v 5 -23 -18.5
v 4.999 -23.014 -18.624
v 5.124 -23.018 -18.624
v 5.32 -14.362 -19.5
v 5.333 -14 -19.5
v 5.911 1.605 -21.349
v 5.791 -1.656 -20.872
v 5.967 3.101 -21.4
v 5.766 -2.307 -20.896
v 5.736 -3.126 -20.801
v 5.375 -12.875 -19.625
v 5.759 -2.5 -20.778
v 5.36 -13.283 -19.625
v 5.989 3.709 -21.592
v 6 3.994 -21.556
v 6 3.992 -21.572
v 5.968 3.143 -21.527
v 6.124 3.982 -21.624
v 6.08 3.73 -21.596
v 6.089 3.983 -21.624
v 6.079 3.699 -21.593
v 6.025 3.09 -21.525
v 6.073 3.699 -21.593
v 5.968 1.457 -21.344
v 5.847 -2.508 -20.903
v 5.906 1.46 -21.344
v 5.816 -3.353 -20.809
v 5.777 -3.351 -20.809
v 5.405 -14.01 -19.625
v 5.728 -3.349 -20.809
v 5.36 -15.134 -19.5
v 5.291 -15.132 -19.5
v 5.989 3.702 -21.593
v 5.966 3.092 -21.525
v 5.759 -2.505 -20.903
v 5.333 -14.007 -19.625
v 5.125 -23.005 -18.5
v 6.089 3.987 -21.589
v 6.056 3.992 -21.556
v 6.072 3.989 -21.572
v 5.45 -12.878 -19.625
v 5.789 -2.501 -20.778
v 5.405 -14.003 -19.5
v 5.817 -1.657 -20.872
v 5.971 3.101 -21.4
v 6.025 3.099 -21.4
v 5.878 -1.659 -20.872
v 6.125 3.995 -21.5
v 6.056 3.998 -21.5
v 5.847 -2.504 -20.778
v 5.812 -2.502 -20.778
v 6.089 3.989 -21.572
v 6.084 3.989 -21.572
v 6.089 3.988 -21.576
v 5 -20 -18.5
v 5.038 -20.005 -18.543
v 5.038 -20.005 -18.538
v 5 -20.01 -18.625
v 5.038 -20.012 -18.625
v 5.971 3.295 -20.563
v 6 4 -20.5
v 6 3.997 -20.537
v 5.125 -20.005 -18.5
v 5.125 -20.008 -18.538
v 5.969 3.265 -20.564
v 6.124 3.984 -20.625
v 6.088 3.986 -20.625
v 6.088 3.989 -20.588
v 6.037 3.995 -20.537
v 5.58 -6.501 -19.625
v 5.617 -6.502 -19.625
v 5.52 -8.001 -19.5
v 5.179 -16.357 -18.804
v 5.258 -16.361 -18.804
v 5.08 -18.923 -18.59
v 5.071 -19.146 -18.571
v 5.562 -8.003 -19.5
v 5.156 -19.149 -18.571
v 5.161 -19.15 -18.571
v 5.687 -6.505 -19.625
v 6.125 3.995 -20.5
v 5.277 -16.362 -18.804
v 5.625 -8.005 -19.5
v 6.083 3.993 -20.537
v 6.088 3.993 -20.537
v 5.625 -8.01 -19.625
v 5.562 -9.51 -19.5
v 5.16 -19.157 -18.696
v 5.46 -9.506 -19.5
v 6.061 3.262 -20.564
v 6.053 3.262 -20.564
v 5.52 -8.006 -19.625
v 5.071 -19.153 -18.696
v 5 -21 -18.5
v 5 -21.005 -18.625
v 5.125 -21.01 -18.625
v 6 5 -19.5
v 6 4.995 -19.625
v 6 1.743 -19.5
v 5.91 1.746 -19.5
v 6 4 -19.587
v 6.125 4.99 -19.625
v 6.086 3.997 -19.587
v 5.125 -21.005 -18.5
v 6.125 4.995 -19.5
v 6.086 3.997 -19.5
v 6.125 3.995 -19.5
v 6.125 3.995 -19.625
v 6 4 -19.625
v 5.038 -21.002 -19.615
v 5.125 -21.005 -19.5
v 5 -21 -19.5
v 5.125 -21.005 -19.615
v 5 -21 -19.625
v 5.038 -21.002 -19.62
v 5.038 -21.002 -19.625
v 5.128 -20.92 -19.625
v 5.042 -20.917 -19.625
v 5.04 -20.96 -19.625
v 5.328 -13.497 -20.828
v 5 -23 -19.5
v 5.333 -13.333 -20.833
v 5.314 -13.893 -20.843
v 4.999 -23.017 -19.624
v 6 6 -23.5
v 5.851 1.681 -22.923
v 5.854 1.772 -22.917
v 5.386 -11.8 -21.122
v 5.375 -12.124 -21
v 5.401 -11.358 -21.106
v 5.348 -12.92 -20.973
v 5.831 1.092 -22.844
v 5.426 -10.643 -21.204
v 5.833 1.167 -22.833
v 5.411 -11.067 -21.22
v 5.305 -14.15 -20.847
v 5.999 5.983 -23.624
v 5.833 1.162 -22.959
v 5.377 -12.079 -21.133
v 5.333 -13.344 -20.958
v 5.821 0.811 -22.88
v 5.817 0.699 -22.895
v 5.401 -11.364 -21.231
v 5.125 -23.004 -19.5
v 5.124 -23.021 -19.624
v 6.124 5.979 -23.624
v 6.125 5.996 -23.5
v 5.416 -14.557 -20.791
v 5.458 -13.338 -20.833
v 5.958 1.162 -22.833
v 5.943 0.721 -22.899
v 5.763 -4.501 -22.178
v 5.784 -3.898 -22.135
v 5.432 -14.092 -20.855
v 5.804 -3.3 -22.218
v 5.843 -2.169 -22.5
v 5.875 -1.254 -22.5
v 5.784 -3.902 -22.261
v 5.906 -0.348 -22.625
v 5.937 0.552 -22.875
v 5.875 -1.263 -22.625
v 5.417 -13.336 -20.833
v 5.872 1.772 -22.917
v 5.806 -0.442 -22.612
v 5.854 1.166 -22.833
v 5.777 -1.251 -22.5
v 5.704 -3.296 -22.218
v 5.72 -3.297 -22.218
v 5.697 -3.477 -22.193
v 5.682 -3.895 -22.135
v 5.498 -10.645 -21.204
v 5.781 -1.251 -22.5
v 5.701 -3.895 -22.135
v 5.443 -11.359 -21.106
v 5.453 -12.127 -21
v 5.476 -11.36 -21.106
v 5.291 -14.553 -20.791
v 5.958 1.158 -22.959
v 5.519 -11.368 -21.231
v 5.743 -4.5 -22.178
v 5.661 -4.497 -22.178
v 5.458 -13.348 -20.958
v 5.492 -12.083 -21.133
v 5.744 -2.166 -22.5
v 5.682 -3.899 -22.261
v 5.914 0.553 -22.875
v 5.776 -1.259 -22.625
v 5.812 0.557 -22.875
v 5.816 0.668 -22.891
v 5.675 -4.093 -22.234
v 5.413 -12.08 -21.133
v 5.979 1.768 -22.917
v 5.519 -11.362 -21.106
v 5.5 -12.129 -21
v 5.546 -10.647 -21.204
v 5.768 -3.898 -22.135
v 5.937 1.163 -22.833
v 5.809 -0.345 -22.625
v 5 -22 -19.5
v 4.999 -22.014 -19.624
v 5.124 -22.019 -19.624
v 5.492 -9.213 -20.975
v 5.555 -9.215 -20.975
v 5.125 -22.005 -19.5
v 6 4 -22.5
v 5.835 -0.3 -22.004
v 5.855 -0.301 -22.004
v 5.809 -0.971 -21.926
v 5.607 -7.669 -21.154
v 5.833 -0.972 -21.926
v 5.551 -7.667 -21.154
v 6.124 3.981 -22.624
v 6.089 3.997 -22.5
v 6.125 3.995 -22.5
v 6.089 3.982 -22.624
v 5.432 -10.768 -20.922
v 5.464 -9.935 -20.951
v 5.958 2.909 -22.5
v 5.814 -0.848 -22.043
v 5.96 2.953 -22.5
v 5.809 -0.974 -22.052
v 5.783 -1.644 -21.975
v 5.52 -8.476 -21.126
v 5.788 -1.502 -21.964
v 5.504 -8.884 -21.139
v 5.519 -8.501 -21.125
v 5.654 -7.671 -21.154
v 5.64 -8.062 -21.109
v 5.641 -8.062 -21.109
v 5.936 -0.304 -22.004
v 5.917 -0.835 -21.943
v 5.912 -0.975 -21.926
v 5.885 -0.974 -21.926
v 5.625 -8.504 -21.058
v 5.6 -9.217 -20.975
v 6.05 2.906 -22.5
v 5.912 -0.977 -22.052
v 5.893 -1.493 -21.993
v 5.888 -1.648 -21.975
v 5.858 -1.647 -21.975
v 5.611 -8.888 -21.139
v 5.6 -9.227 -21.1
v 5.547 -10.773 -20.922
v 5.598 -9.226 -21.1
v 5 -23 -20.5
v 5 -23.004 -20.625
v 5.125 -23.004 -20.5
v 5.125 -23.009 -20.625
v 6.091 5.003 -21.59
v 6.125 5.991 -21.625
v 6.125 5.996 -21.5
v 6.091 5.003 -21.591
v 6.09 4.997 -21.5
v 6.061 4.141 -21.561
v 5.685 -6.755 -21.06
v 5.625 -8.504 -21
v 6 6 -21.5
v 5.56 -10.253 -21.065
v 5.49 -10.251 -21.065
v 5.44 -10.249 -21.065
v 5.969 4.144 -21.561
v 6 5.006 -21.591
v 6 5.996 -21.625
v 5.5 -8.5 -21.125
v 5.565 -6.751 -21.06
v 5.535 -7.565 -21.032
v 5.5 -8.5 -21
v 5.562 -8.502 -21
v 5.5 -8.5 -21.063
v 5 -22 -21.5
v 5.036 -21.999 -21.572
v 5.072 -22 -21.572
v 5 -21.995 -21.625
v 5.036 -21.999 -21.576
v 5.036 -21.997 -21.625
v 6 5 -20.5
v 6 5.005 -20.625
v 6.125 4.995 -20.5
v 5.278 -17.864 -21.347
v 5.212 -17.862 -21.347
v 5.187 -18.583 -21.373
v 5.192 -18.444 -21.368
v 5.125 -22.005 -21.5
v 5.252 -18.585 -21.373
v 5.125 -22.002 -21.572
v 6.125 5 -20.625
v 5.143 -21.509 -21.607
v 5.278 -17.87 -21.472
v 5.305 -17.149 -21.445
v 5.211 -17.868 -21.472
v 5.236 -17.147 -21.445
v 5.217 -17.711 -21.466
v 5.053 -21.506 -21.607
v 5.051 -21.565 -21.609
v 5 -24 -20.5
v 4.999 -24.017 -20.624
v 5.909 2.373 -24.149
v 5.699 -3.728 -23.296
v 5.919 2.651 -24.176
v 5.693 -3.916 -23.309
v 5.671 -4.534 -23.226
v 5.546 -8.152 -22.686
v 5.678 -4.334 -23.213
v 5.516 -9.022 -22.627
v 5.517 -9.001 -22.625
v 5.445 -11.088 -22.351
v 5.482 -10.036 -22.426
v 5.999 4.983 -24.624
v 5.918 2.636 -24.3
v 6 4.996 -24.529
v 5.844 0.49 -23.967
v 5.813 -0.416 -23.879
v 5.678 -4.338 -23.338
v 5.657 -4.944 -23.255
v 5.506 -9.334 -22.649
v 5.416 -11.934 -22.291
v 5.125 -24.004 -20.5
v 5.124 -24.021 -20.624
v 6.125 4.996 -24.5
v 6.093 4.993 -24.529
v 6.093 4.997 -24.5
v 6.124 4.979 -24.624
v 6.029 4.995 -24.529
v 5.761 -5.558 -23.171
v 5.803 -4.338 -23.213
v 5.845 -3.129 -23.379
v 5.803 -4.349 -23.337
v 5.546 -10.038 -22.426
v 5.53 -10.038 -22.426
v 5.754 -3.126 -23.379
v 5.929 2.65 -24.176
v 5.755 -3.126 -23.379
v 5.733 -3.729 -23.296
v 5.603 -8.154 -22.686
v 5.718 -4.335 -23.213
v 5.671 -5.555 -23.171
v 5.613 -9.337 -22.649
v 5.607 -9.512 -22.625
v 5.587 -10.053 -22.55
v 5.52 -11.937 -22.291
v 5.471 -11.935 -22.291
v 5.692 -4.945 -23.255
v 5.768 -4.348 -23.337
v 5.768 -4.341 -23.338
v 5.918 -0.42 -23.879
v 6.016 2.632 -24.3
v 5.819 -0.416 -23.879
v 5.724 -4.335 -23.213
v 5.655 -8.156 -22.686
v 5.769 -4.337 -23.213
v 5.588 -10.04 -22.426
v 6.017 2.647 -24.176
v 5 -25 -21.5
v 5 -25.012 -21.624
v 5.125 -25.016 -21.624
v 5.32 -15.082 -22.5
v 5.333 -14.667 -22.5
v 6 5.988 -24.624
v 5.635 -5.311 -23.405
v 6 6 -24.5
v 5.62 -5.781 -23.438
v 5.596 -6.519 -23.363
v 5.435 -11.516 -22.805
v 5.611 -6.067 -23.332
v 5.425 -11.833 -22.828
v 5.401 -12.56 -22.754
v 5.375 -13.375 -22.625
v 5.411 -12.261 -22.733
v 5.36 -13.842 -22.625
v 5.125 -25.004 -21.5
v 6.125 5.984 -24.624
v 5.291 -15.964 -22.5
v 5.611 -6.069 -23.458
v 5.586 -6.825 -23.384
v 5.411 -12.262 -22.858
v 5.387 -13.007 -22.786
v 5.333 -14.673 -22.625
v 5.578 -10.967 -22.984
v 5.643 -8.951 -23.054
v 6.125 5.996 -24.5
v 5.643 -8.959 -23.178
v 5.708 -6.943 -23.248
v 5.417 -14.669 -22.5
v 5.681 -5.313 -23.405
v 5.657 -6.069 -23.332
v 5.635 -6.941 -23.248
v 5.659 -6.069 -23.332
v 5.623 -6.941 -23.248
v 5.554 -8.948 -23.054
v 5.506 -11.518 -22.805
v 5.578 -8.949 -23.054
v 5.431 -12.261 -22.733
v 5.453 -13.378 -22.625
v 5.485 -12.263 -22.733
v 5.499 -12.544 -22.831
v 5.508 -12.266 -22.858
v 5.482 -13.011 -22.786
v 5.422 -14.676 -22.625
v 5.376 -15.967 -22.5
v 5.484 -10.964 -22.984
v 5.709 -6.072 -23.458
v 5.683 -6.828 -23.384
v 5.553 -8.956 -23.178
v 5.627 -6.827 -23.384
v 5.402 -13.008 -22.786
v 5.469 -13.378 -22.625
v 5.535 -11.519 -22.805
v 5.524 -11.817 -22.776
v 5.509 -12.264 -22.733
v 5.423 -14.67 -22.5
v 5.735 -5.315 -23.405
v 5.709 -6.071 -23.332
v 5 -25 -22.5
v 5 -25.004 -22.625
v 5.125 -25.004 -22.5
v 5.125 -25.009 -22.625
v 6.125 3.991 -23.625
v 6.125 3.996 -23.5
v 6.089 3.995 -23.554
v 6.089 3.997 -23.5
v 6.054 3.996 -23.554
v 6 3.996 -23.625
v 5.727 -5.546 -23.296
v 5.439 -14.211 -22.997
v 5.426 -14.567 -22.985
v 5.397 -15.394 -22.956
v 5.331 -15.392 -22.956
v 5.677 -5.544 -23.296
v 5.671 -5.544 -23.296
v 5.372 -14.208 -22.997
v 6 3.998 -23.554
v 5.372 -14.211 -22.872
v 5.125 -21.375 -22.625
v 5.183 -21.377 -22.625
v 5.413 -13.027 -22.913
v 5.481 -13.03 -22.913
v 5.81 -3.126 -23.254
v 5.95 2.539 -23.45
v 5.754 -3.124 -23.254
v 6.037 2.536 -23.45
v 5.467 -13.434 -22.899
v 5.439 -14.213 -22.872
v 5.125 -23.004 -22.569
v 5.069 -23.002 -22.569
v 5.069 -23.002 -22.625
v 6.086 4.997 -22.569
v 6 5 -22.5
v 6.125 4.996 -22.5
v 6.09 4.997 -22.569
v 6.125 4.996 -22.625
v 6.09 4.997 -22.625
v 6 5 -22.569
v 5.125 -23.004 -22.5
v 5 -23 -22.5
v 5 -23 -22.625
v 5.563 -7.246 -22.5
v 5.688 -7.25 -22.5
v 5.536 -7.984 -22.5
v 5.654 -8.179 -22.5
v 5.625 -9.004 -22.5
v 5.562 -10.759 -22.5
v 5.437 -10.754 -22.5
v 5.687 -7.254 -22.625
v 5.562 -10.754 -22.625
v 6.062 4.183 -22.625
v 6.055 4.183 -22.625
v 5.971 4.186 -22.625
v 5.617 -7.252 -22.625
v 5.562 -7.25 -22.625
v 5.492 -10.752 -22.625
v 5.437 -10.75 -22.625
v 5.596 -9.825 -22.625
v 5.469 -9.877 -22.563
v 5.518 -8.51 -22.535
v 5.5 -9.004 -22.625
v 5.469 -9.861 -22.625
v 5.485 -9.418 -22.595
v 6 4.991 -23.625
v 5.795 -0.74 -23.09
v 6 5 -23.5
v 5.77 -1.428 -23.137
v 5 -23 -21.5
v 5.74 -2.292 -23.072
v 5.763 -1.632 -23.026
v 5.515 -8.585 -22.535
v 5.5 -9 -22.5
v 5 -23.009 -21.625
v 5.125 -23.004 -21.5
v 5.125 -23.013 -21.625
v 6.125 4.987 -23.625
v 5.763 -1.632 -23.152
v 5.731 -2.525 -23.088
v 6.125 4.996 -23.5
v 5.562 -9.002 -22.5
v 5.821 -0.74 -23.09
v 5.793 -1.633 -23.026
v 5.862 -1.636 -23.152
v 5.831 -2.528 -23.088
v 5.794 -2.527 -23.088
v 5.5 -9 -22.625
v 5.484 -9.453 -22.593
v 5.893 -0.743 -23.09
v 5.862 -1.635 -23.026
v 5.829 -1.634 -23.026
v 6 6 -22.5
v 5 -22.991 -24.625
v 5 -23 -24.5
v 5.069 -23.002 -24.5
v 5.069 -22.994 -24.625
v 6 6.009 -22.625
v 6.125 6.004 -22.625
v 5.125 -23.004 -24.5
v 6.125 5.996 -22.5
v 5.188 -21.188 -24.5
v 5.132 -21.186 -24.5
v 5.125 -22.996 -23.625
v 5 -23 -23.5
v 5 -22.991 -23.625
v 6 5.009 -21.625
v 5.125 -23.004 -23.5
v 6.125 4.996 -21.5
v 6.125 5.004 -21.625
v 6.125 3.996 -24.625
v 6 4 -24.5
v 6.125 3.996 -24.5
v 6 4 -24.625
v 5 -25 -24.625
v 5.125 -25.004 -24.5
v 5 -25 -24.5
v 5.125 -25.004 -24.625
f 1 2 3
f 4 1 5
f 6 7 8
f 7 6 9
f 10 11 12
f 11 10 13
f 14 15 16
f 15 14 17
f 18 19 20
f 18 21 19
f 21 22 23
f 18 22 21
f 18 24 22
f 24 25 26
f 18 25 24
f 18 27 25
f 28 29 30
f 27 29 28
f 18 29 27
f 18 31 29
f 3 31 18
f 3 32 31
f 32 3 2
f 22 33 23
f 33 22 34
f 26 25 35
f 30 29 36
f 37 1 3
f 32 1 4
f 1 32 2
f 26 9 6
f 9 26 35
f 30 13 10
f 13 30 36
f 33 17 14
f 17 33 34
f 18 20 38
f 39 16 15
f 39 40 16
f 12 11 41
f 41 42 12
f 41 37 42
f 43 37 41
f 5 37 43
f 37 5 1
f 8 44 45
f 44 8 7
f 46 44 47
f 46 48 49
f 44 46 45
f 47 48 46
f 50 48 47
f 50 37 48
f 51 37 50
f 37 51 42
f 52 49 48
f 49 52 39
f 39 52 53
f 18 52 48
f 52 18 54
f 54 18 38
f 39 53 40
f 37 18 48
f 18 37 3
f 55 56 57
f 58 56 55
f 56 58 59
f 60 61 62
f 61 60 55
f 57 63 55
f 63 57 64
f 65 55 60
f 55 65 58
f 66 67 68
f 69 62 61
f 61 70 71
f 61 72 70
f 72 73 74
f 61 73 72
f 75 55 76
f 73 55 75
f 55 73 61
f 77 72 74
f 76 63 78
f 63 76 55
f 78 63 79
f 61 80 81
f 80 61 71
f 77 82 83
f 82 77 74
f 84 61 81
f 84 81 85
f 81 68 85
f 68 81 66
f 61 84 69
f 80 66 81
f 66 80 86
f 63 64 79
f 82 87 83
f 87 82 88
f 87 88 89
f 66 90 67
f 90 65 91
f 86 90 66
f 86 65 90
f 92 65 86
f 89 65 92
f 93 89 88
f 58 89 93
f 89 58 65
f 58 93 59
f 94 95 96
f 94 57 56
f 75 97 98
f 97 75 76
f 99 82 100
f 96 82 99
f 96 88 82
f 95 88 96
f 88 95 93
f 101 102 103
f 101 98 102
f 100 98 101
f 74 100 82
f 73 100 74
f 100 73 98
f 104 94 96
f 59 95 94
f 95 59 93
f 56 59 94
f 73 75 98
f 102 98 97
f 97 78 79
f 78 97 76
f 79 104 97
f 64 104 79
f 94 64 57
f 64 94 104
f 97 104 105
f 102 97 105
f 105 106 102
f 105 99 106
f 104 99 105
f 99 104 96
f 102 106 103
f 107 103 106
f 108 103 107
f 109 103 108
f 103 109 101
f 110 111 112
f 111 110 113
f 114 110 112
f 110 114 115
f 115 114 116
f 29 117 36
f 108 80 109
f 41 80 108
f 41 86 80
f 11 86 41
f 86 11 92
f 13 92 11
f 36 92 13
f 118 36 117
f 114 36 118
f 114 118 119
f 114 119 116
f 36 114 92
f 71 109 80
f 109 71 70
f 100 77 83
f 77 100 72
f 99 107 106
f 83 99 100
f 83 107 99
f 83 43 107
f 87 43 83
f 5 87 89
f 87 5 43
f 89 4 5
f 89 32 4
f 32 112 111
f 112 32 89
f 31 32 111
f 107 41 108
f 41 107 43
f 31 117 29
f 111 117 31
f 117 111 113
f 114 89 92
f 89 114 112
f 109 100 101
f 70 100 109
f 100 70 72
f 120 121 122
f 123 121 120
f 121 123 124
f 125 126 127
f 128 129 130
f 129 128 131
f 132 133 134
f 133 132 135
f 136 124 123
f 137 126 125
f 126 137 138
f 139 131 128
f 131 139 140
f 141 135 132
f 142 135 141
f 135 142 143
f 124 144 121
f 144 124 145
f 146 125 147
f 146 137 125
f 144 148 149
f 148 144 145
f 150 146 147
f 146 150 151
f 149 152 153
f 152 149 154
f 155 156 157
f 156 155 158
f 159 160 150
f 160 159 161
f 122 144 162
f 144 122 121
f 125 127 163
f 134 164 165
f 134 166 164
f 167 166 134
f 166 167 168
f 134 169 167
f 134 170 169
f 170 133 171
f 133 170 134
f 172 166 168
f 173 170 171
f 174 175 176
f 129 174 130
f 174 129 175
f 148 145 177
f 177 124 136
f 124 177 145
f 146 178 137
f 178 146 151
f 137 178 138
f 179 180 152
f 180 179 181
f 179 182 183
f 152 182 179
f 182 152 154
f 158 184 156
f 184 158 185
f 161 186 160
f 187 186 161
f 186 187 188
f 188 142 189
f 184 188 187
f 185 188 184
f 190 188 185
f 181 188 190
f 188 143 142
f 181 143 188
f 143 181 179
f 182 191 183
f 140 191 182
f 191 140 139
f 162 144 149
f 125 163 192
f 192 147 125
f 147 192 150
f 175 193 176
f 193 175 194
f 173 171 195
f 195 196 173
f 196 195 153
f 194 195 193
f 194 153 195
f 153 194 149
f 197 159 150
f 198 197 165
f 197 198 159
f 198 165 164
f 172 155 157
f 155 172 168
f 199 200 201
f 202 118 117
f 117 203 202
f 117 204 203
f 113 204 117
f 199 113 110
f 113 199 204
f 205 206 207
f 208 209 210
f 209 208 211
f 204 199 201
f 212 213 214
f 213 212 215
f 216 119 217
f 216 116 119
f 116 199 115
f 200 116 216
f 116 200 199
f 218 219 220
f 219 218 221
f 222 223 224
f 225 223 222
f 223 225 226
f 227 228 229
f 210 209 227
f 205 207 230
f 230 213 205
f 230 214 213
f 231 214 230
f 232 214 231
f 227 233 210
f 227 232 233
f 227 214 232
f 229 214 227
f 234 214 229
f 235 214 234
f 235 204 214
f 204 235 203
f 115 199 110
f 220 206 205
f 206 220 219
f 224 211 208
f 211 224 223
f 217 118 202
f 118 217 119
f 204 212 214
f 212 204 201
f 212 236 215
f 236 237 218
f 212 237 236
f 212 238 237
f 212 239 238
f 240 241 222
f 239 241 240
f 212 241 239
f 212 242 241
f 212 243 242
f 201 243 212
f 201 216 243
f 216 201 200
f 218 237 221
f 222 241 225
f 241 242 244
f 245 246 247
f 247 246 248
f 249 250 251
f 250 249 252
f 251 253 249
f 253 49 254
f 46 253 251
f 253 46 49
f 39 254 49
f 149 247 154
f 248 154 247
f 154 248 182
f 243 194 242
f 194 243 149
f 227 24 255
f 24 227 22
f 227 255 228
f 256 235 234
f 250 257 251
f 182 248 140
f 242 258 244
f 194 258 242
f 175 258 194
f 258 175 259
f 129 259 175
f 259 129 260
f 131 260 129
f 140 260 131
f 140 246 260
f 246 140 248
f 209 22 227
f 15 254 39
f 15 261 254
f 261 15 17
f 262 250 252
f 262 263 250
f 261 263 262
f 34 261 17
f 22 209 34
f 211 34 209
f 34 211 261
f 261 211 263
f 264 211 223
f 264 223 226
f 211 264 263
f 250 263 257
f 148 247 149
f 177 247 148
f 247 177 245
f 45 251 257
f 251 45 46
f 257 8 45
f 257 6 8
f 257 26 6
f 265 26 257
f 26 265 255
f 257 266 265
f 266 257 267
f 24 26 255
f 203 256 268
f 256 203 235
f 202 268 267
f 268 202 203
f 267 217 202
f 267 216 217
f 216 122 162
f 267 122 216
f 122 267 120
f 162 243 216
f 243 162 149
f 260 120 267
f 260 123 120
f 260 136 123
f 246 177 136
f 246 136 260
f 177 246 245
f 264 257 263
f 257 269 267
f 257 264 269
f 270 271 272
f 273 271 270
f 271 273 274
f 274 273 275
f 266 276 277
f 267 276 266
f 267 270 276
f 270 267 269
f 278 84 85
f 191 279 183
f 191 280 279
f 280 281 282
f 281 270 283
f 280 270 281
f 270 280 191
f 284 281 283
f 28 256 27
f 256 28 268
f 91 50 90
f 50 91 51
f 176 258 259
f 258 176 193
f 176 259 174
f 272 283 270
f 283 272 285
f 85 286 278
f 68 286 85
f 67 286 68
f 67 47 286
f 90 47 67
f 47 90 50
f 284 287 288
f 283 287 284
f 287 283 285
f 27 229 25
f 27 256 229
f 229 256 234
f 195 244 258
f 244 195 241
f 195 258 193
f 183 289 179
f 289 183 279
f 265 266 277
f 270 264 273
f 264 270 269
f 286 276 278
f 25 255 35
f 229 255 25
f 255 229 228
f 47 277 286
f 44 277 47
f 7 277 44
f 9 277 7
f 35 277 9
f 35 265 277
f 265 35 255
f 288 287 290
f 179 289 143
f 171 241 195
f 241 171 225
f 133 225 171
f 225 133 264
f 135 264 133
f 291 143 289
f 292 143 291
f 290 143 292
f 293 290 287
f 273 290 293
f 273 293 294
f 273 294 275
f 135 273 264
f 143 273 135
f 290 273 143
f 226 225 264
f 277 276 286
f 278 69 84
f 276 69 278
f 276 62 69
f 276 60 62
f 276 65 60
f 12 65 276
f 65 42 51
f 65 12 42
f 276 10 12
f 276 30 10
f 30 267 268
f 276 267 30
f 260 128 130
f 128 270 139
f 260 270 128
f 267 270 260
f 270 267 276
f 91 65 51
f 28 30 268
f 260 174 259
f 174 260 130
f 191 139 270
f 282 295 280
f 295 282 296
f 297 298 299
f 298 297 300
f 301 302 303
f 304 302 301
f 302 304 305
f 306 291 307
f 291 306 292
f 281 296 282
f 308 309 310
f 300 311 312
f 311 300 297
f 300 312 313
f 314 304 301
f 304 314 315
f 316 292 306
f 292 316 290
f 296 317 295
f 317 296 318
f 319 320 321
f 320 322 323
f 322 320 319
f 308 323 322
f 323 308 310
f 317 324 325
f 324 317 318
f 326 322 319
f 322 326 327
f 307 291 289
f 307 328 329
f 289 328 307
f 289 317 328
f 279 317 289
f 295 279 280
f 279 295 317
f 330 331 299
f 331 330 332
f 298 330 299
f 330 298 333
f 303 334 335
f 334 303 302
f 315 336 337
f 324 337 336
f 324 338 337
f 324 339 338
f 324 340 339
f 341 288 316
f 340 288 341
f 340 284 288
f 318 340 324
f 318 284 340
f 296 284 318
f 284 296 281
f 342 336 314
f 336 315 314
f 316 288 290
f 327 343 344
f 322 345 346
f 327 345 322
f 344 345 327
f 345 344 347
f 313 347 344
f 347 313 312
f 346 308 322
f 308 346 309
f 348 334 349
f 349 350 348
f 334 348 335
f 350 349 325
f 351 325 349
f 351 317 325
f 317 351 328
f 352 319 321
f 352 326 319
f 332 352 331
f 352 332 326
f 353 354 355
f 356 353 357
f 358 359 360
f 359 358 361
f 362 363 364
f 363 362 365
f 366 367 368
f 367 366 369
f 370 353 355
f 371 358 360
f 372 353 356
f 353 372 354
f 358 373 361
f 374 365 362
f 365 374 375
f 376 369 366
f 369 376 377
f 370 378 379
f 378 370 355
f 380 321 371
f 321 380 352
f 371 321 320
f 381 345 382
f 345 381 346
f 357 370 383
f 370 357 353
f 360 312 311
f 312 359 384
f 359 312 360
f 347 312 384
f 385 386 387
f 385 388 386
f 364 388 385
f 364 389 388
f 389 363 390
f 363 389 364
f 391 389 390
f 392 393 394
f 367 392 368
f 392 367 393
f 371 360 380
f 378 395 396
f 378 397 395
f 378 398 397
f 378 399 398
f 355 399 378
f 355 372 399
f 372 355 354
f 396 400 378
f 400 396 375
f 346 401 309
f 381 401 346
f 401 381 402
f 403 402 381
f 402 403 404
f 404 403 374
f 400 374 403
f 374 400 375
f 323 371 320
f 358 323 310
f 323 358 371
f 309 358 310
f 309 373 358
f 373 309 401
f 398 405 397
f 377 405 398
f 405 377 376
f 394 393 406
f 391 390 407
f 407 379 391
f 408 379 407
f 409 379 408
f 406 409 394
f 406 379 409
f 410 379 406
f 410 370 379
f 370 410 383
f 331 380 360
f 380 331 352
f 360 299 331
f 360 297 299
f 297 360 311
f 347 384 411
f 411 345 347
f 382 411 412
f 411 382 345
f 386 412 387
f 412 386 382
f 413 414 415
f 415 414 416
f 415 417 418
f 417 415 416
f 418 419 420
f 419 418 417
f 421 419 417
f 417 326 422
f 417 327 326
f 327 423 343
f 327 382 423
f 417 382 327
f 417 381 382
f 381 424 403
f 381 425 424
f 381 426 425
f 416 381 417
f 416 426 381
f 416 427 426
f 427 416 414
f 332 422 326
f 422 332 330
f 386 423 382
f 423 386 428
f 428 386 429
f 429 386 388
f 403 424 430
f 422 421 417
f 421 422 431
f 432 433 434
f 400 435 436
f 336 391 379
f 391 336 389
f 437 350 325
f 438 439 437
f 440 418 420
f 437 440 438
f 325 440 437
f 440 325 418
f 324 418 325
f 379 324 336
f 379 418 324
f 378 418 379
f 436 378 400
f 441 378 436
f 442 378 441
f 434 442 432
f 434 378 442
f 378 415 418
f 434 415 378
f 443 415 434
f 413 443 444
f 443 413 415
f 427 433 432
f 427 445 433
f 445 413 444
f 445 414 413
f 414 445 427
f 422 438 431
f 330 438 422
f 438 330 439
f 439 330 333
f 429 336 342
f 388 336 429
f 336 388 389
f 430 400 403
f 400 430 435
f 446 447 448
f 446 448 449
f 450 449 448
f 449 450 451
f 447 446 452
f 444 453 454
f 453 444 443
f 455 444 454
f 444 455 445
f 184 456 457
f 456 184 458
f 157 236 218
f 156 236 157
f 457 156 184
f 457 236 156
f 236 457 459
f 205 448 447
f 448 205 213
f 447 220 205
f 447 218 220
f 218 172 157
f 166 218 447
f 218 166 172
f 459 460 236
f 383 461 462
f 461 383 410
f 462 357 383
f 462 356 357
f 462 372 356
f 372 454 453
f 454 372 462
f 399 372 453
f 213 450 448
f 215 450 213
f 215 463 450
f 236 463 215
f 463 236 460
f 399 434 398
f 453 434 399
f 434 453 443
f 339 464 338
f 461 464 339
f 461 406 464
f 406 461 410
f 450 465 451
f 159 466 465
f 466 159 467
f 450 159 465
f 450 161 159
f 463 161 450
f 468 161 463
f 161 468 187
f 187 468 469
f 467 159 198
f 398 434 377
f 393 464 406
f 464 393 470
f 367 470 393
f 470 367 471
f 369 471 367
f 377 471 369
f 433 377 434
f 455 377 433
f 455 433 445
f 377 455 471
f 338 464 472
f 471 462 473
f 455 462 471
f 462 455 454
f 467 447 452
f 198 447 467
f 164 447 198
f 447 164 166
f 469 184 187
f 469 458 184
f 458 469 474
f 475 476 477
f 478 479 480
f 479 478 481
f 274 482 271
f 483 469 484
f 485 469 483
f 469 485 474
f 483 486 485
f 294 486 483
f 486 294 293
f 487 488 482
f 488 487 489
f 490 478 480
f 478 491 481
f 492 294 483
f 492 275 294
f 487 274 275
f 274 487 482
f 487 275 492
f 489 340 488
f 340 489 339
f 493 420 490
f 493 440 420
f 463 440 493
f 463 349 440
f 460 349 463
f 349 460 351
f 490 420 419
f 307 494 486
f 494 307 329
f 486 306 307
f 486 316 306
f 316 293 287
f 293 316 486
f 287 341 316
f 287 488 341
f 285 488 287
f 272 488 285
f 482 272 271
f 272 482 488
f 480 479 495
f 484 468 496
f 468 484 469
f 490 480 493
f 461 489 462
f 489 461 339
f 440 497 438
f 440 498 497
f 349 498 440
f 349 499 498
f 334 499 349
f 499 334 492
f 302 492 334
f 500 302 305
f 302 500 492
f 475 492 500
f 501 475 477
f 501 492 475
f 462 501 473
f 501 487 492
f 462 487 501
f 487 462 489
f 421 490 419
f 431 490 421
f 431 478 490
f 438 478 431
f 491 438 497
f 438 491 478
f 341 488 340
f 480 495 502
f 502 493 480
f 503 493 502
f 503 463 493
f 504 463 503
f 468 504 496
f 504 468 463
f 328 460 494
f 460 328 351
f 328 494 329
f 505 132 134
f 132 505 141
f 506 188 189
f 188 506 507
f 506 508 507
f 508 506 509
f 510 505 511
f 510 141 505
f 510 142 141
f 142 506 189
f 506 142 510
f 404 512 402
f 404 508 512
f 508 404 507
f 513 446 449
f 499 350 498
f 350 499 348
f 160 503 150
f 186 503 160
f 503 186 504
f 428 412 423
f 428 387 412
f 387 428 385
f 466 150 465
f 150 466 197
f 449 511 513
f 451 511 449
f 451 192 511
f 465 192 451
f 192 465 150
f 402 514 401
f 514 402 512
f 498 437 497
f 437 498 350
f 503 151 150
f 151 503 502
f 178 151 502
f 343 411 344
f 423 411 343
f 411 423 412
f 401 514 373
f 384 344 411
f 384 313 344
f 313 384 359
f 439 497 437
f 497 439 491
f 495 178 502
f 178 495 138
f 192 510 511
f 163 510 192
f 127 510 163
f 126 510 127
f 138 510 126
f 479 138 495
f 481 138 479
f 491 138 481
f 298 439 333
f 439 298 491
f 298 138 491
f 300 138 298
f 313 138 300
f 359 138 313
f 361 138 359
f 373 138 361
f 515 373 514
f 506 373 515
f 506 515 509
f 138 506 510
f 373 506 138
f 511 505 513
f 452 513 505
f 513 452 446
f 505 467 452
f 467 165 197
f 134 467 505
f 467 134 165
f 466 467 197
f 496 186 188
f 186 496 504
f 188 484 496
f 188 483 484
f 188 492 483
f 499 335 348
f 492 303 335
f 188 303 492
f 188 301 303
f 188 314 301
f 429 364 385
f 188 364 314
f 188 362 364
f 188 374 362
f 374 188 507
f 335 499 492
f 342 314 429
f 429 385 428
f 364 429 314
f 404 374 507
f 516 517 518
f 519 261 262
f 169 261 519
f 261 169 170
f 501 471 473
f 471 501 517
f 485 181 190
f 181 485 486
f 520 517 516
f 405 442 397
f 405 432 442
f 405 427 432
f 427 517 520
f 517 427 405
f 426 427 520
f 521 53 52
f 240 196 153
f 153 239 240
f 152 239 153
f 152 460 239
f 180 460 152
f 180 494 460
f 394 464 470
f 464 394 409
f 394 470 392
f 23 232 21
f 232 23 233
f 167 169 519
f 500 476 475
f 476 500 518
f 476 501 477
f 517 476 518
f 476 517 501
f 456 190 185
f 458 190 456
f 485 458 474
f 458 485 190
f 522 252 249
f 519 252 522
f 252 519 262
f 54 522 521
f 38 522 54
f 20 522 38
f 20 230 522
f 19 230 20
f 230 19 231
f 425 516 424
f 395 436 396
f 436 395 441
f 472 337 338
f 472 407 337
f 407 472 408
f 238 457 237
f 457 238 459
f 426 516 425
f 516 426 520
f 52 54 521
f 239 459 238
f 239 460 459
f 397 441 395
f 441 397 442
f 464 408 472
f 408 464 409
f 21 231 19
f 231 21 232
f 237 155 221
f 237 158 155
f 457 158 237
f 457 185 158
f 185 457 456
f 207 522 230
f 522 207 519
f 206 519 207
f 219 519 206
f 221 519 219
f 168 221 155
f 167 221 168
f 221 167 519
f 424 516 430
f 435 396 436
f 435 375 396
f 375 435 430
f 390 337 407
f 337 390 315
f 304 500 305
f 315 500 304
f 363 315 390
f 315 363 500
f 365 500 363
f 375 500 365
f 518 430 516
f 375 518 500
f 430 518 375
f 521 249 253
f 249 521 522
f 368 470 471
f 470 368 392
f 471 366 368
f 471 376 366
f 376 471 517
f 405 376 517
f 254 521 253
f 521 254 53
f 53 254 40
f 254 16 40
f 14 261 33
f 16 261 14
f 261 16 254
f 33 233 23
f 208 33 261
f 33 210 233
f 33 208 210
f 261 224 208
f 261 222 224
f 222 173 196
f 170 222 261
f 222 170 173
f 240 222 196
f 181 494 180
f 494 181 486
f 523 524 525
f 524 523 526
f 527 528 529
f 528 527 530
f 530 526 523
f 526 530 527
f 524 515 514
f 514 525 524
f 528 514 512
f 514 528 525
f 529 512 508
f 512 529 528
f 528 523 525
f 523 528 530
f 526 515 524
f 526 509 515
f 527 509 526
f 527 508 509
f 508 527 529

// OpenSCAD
translate(v = [-0.5, -0.5, 0]) {
	/*Shell 0*/
	union() {
		%/*Nodes shell 0*/
		union();
		/*Edges shell 0*/
		union();
	}
	/*Shell 1*/
	union() {
		%/*Nodes shell 1*/
		union() {
			/*Node bank.devices[0].thingy.vcollect*/
			color(alpha = 0.1, c = "black") {
				translate(v = [1, -25, -23]) {
					cube(size = [1, 1, 1]);
				}
			}
			/*Node bank.devices[0].thingy.vlysis_out*/
			color(alpha = 0.1, c = "black") {
				translate(v = [1, 22, 25]) {
					cube(size = [1, 1, 1]);
				}
			}
			/*Node bank.devices[0].thingy.vwaste*/
			color(alpha = 0.1, c = "black") {
				translate(v = [1, -23, -25]) {
					cube(size = [1, 1, 1]);
				}
			}
			/*Node bank.devices[1].thingy.vcollect*/
			color(alpha = 0.1, c = "black") {
				translate(v = [1, -25, -21]) {
					cube(size = [1, 1, 1]);
				}
			}
			/*Node bank.devices[1].thingy.vlysis_out*/
			color(alpha = 0.1, c = "black") {
				translate(v = [1, 25, -25]) {
					cube(size = [1, 1, 1]);
				}
			}
			/*Node bank.devices[1].thingy.vwaste*/
			color(alpha = 0.1, c = "black") {
				translate(v = [1, -25, -22]) {
					cube(size = [1, 1, 1]);
				}
			}
			/*Node bank.devices[2].thingy.vcollect*/
			color(alpha = 0.1, c = "black") {
				translate(v = [1, -23, -22]) {
					cube(size = [1, 1, 1]);
				}
			}
			/*Node bank.devices[2].thingy.vlysis_out*/
			color(alpha = 0.1, c = "black") {
				translate(v = [1, 23, 25]) {
					cube(size = [1, 1, 1]);
				}
			}
			/*Node bank.devices[2].thingy.vwaste*/
			color(alpha = 0.1, c = "black") {
				translate(v = [1, -25, -24]) {
					cube(size = [1, 1, 1]);
				}
			}
			/*Node bank.devices[3].thingy.vcollect*/
			color(alpha = 0.1, c = "black") {
				translate(v = [1, -18, -25]) {
					cube(size = [1, 1, 1]);
				}
			}
			/*Node bank.devices[3].thingy.vlysis_out*/
			color(alpha = 0.1, c = "black") {
				translate(v = [1, 25, 22]) {
					cube(size = [1, 1, 1]);
				}
			}
			/*Node bank.devices[3].thingy.vwaste*/
			color(alpha = 0.1, c = "black") {
				translate(v = [1, -20, -25]) {
					cube(size = [1, 1, 1]);
				}
			}
			/*Node $_8__1*/
			color(alpha = 0.1, c = "lightblue") {
				translate(v = [1, -22, -25]) {
					cube(size = [1, 1, 1]);
				}
			}
			/*Node $_15__1*/
			color(alpha = 0.1, c = "lightblue") {
				translate(v = [1, 22, -25]) {
					cube(size = [1, 1, 1]);
				}
			}
			/*Node $_9__1*/
			color(alpha = 0.1, c = "lightblue") {
				translate(v = [1, -21, -25]) {
					cube(size = [1, 1, 1]);
				}
			}
			/*Node $_7__1*/
			color(alpha = 0.1, c = "lightblue") {
				translate(v = [1, -22, -24]) {
					cube(size = [1, 1, 1]);
				}
			}
			/*Node $_6__1*/
			color(alpha = 0.1, c = "lightblue") {
				translate(v = [1, -25, -25]) {
					cube(size = [1, 1, 1]);
				}
			}
			/*Node $_17__1*/
			color(alpha = 0.1, c = "lightblue") {
				translate(v = [1, 24, 25]) {
					cube(size = [1, 1, 1]);
				}
			}
			/*Node $_14__1*/
			color(alpha = 0.1, c = "lightblue") {
				translate(v = [1, 21, 25]) {
					cube(size = [1, 1, 1]);
				}
			}
			/*Node $_16__1*/
			color(alpha = 0.1, c = "lightblue") {
				translate(v = [1, 25, 25]) {
					cube(size = [1, 1, 1]);
				}
			}
		}
		/*Edges shell 1*/
		union();
	}
	/*Shell 2*/
	union() {
		%/*Nodes shell 2*/
		union();
		/*Edges shell 2*/
		union();
	}
	/*Shell 3*/
	union() {
		%/*Nodes shell 3*/
		union() {
			/*Node bank.devices[0].thingy.vbead_out*/
			color(alpha = 0.1, c = "black") {
				translate(v = [3, -10, -21]) {
					cube(size = [1, 1, 1]);
				}
			}
			/*Node bank.devices[0].thingy.vcell_out*/
			color(alpha = 0.1, c = "black") {
				translate(v = [3, -10, -23]) {
					cube(size = [1, 1, 1]);
				}
			}
			/*Node bank.devices[0].thingy.vpump1*/
			color(alpha = 0.1, c = "black") {
				translate(v = [3, -11, -23]) {
					cube(size = [1, 1, 1]);
				}
			}
			/*Node bank.devices[0].thingy.vpump2*/
			color(alpha = 0.1, c = "black") {
				translate(v = [3, -12, -25]) {
					cube(size = [1, 1, 1]);
				}
			}
			/*Node bank.devices[0].thingy.vpump3*/
			color(alpha = 0.1, c = "black") {
				translate(v = [3, -13, -23]) {
					cube(size = [1, 1, 1]);
				}
			}
			/*Node bank.devices[0].thingy.vsep*/
			color(alpha = 0.1, c = "black") {
				translate(v = [3, -12, -21]) {
					cube(size = [1, 1, 1]);
				}
			}
			/*Node bank.devices[0].thingy.vsieve*/
			color(alpha = 0.1, c = "black") {
				translate(v = [3, -12, -19]) {
					cube(size = [1, 1, 1]);
				}
			}
			/*Node bank.devices[1].thingy.vbead_out*/
			color(alpha = 0.1, c = "black") {
				translate(v = [3, -10, -20]) {
					cube(size = [1, 1, 1]);
				}
			}
			/*Node bank.devices[1].thingy.vcell_out*/
			color(alpha = 0.1, c = "black") {
				translate(v = [3, -13, -20]) {
					cube(size = [1, 1, 1]);
				}
			}
			/*Node bank.devices[1].thingy.vpump1*/
			color(alpha = 0.1, c = "black") {
				translate(v = [3, -13, -21]) {
					cube(size = [1, 1, 1]);
				}
			}
			/*Node bank.devices[1].thingy.vpump2*/
			color(alpha = 0.1, c = "black") {
				translate(v = [3, -14, -22]) {
					cube(size = [1, 1, 1]);
				}
			}
			/*Node bank.devices[1].thingy.vpump3*/
			color(alpha = 0.1, c = "black") {
				translate(v = [3, -13, -22]) {
					cube(size = [1, 1, 1]);
				}
			}
			/*Node bank.devices[1].thingy.vsep*/
			color(alpha = 0.1, c = "black") {
				translate(v = [3, -11, -20]) {
					cube(size = [1, 1, 1]);
				}
			}
			/*Node bank.devices[1].thingy.vsieve*/
			color(alpha = 0.1, c = "black") {
				translate(v = [3, -9, -21]) {
					cube(size = [1, 1, 1]);
				}
			}
			/*Node bank.devices[2].thingy.vbead_out*/
			color(alpha = 0.1, c = "black") {
				translate(v = [3, -9, -22]) {
					cube(size = [1, 1, 1]);
				}
			}
			/*Node bank.devices[2].thingy.vcell_out*/
			color(alpha = 0.1, c = "black") {
				translate(v = [3, -12, -20]) {
					cube(size = [1, 1, 1]);
				}
			}
			/*Node bank.devices[2].thingy.vpump1*/
			color(alpha = 0.1, c = "black") {
				translate(v = [3, -11, -22]) {
					cube(size = [1, 1, 1]);
				}
			}
			/*Node bank.devices[2].thingy.vpump2*/
			color(alpha = 0.1, c = "black") {
				translate(v = [3, -12, -22]) {
					cube(size = [1, 1, 1]);
				}
			}
			/*Node bank.devices[2].thingy.vpump3*/
			color(alpha = 0.1, c = "black") {
				translate(v = [3, -11, -24]) {
					cube(size = [1, 1, 1]);
				}
			}
			/*Node bank.devices[2].thingy.vsep*/
			color(alpha = 0.1, c = "black") {
				translate(v = [3, -10, -22]) {
					cube(size = [1, 1, 1]);
				}
			}
			/*Node bank.devices[2].thingy.vsieve*/
			color(alpha = 0.1, c = "black") {
				translate(v = [3, -8, -20]) {
					cube(size = [1, 1, 1]);
				}
			}
			/*Node bank.devices[3].thingy.vbead_out*/
			color(alpha = 0.1, c = "black") {
				translate(v = [3, -8, -22]) {
					cube(size = [1, 1, 1]);
				}
			}
			/*Node bank.devices[3].thingy.vcell_out*/
			color(alpha = 0.1, c = "black") {
				translate(v = [3, -10, -25]) {
					cube(size = [1, 1, 1]);
				}
			}
			/*Node bank.devices[3].thingy.vpump1*/
			color(alpha = 0.1, c = "black") {
				translate(v = [3, -9, -23]) {
					cube(size = [1, 1, 1]);
				}
			}
			/*Node bank.devices[3].thingy.vpump2*/
			color(alpha = 0.1, c = "black") {
				translate(v = [3, -11, -25]) {
					cube(size = [1, 1, 1]);
				}
			}
			/*Node bank.devices[3].thingy.vpump3*/
			color(alpha = 0.1, c = "black") {
				translate(v = [3, -9, -25]) {
					cube(size = [1, 1, 1]);
				}
			}
			/*Node bank.devices[3].thingy.vsep*/
			color(alpha = 0.1, c = "black") {
				translate(v = [3, -7, -23]) {
					cube(size = [1, 1, 1]);
				}
			}
			/*Node bank.devices[3].thingy.vsieve*/
			color(alpha = 0.1, c = "black") {
				translate(v = [3, -8, -23]) {
					cube(size = [1, 1, 1]);
				}
			}
		}
		/*Edges shell 3*/
		union();
	}
	/*Shell 4*/
	union() {
		%/*Nodes shell 4*/
		union();
		/*Edges shell 4*/
		union();
	}
	/*Shell 5*/
	union() {
		%/*Nodes shell 5*/
		union() {
			/*Node bank.devices[0].thingy.vbead_in*/
			color(alpha = 0.1, c = "black") {
				translate(v = [5, -23, -19]) {
					cube(size = [1, 1, 1]);
				}
			}
			/*Node bank.devices[0].thingy.vcell_in*/
			color(alpha = 0.1, c = "black") {
				translate(v = [5, -20, -19]) {
					cube(size = [1, 1, 1]);
				}
			}
			/*Node bank.devices[0].thingy.vlysis_in*/
			color(alpha = 0.1, c = "black") {
				translate(v = [5, -21, -19]) {
					cube(size = [1, 1, 1]);
				}
			}
			/*Node bank.devices[0].thingy.vpush*/
			color(alpha = 0.1, c = "black") {
				translate(v = [5, -21, -20]) {
					cube(size = [1, 1, 1]);
				}
			}
			/*Node bank.devices[1].thingy.vbead_in*/
			color(alpha = 0.1, c = "black") {
				translate(v = [5, -23, -20]) {
					cube(size = [1, 1, 1]);
				}
			}
			/*Node bank.devices[1].thingy.vcell_in*/
			color(alpha = 0.1, c = "black") {
				translate(v = [5, -22, -20]) {
					cube(size = [1, 1, 1]);
				}
			}
			/*Node bank.devices[1].thingy.vlysis_in*/
			color(alpha = 0.1, c = "black") {
				translate(v = [5, -23, -21]) {
					cube(size = [1, 1, 1]);
				}
			}
			/*Node bank.devices[1].thingy.vpush*/
			color(alpha = 0.1, c = "black") {
				translate(v = [5, -22, -22]) {
					cube(size = [1, 1, 1]);
				}
			}
			/*Node bank.devices[2].thingy.vbead_in*/
			color(alpha = 0.1, c = "black") {
				translate(v = [5, -24, -21]) {
					cube(size = [1, 1, 1]);
				}
			}
			/*Node bank.devices[2].thingy.vcell_in*/
			color(alpha = 0.1, c = "black") {
				translate(v = [5, -25, -22]) {
					cube(size = [1, 1, 1]);
				}
			}
			/*Node bank.devices[2].thingy.vlysis_in*/
			color(alpha = 0.1, c = "black") {
				translate(v = [5, -25, -23]) {
					cube(size = [1, 1, 1]);
				}
			}
			/*Node bank.devices[2].thingy.vpush*/
			color(alpha = 0.1, c = "black") {
				translate(v = [5, -23, -23]) {
					cube(size = [1, 1, 1]);
				}
			}
			/*Node bank.devices[3].thingy.vbead_in*/
			color(alpha = 0.1, c = "black") {
				translate(v = [5, -23, -22]) {
					cube(size = [1, 1, 1]);
				}
			}
			/*Node bank.devices[3].thingy.vcell_in*/
			color(alpha = 0.1, c = "black") {
				translate(v = [5, -23, -25]) {
					cube(size = [1, 1, 1]);
				}
			}
			/*Node bank.devices[3].thingy.vlysis_in*/
			color(alpha = 0.1, c = "black") {
				translate(v = [5, -23, -24]) {
					cube(size = [1, 1, 1]);
				}
			}
			/*Node bank.devices[3].thingy.vpush*/
			color(alpha = 0.1, c = "black") {
				translate(v = [5, -25, -25]) {
					cube(size = [1, 1, 1]);
				}
			}
		}
		/*Edges shell 5*/
		union() {
			/*Edge 2 from bank.devices[0].thingy.vbead_in to $_2*/
			translate(v = [6.5, 4.5, -21.5]) {
				rotate(a = [0, 83.6641169998511, -92.12109639666146]) {
					cube(size = [0.125, 0.125, 27.184554438136374]);
				}
			}
			/*Edge 10 from bank.devices[0].thingy.vcell_in to $_10*/
			translate(v = [6.5, 4.5, -20.5]) {
				rotate(a = [0, 85.2404690582266, -92.38594403038881]) {
					cube(size = [0.125, 0.125, 24.1039415863879]);
				}
			}
			/*Edge 22 from bank.devices[0].thingy.vlysis_in to $_22*/
			translate(v = [6.5, 5.5, -19.5]) {
				rotate(a = [0, 87.79902757259437, -92.2025981617658]) {
					cube(size = [0.125, 0.125, 26.038433132583073]);
				}
			}
			/*Edge 30 from bank.devices[0].thingy.vpush to $_30*/
			translate(v = [6.5, 4.5, -19.5]) {
				rotate(a = [0, 90.0, -92.29061004263853]) {
					cube(size = [0.125, 0.125, 25.019992006393608]);
				}
			}
			/*Edge 3 from bank.devices[1].thingy.vbead_in to $_3*/
			translate(v = [6.5, 6.5, -23.5]) {
				rotate(a = [0, 82.15129341501316, -91.97493401088198]) {
					cube(size = [0.125, 0.125, 29.29163703175362]);
				}
			}
			/*Edge 11 from bank.devices[1].thingy.vcell_in to $_11*/
			translate(v = [6.5, 4.5, -22.5]) {
				rotate(a = [0, 83.42287562938745, -92.2025981617658]) {
					cube(size = [0.125, 0.125, 26.19160170741759]);
				}
			}
			/*Edge 23 from bank.devices[1].thingy.vlysis_in to $_23*/
			translate(v = [6.5, 6.5, -21.5]) {
				rotate(a = [0, 88.02623817304688, -91.97493401088198]) {
					cube(size = [0.125, 0.125, 29.03446228191595]);
				}
			}
			/*Edge 31 from bank.devices[1].thingy.vpush to $_31*/
			translate(v = [6.5, 5.5, -20.5]) {
				rotate(a = [0, 92.11964441913105, -92.12109639666146]) {
					cube(size = [0.125, 0.125, 27.03701166919155]);
				}
			}
			/*Edge 4 from bank.devices[2].thingy.vbead_in to $_4*/
			translate(v = [6.5, 5.5, -24.5]) {
				rotate(a = [0, 82.15129341501316, -91.97493401088198]) {
					cube(size = [0.125, 0.125, 29.29163703175362]);
				}
			}
			/*Edge 12 from bank.devices[2].thingy.vcell_in to $_12*/
			translate(v = [6.5, 6.5, -24.5]) {
				rotate(a = [0, 84.47531575349612, -91.8476102659946]) {
					cube(size = [0.125, 0.125, 31.160872901765767]);
				}
			}
			/*Edge 24 from bank.devices[2].thingy.vlysis_in to $_24*/
			translate(v = [6.5, 4.5, -23.5]) {
				rotate(a = [0, 88.02623817304688, -91.97493401088198]) {
					cube(size = [0.125, 0.125, 29.03446228191595]);
				}
			}
			/*Edge 32 from bank.devices[2].thingy.vpush to $_32*/
			translate(v = [6.5, 5.5, -22.5]) {
				rotate(a = [0, 90.0, -92.04540848888723]) {
					cube(size = [0.125, 0.125, 28.0178514522438]);
				}
			}
			/*Edge 5 from bank.devices[3].thingy.vbead_in to $_5*/
			translate(v = [6.5, 5.5, -23.5]) {
				rotate(a = [0, 85.91697754615763, -92.04540848888723]) {
					cube(size = [0.125, 0.125, 28.089143810376278]);
				}
			}
			/*Edge 13 from bank.devices[3].thingy.vcell_in to $_13*/
			translate(v = [6.5, 6.5, -22.5]) {
				rotate(a = [0, 93.94285017945973, -91.97493401088198]) {
					cube(size = [0.125, 0.125, 29.086079144497972]);
				}
			}
			/*Edge 25 from bank.devices[3].thingy.vlysis_in to $_25*/
			translate(v = [6.5, 5.5, -21.5]) {
				rotate(a = [0, 94.08302245384237, -92.04540848888723]) {
					cube(size = [0.125, 0.125, 28.089143810376278]);
				}
			}
			/*Edge 33 from bank.devices[3].thingy.vpush to $_33*/
			translate(v = [6.5, 4.5, -24.5]) {
				rotate(a = [0, 90.0, -91.97493401088198]) {
					cube(size = [0.125, 0.125, 29.017236257093817]);
				}
			}
		}
	}
	/*Shell 6*/
	union() {
		%/*Nodes shell 6*/
		union() {
			/*Node $_2*/
			color(alpha = 0.1, c = "pink") {
				translate(v = [6, 4, -22]) {
					cube(size = [1, 1, 1]);
				}
			}
			/*Node $_10*/
			color(alpha = 0.1, c = "pink") {
				translate(v = [6, 4, -21]) {
					cube(size = [1, 1, 1]);
				}
			}
			/*Node $_22*/
			color(alpha = 0.1, c = "pink") {
				translate(v = [6, 5, -20]) {
					cube(size = [1, 1, 1]);
				}
			}
			/*Node $_30*/
			color(alpha = 0.1, c = "pink") {
				translate(v = [6, 4, -20]) {
					cube(size = [1, 1, 1]);
				}
			}
			/*Node $_3*/
			color(alpha = 0.1, c = "pink") {
				translate(v = [6, 6, -24]) {
					cube(size = [1, 1, 1]);
				}
			}
			/*Node $_11*/
			color(alpha = 0.1, c = "pink") {
				translate(v = [6, 4, -23]) {
					cube(size = [1, 1, 1]);
				}
			}
			/*Node $_23*/
			color(alpha = 0.1, c = "pink") {
				translate(v = [6, 6, -22]) {
					cube(size = [1, 1, 1]);
				}
			}
			/*Node $_31*/
			color(alpha = 0.1, c = "pink") {
				translate(v = [6, 5, -21]) {
					cube(size = [1, 1, 1]);
				}
			}
			/*Node $_4*/
			color(alpha = 0.1, c = "pink") {
				translate(v = [6, 5, -25]) {
					cube(size = [1, 1, 1]);
				}
			}
			/*Node $_12*/
			color(alpha = 0.1, c = "pink") {
				translate(v = [6, 6, -25]) {
					cube(size = [1, 1, 1]);
				}
			}
			/*Node $_24*/
			color(alpha = 0.1, c = "pink") {
				translate(v = [6, 4, -24]) {
					cube(size = [1, 1, 1]);
				}
			}
			/*Node $_32*/
			color(alpha = 0.1, c = "pink") {
				translate(v = [6, 5, -23]) {
					cube(size = [1, 1, 1]);
				}
			}
			/*Node $_5*/
			color(alpha = 0.1, c = "pink") {
				translate(v = [6, 5, -24]) {
					cube(size = [1, 1, 1]);
				}
			}
			/*Node $_13*/
			color(alpha = 0.1, c = "pink") {
				translate(v = [6, 6, -23]) {
					cube(size = [1, 1, 1]);
				}
			}
			/*Node $_25*/
			color(alpha = 0.1, c = "pink") {
				translate(v = [6, 5, -22]) {
					cube(size = [1, 1, 1]);
				}
			}
			/*Node $_33*/
			color(alpha = 0.1, c = "pink") {
				translate(v = [6, 4, -25]) {
					cube(size = [1, 1, 1]);
				}
			}
		}
		/*Edges shell 6*/
		union();
	}
}
